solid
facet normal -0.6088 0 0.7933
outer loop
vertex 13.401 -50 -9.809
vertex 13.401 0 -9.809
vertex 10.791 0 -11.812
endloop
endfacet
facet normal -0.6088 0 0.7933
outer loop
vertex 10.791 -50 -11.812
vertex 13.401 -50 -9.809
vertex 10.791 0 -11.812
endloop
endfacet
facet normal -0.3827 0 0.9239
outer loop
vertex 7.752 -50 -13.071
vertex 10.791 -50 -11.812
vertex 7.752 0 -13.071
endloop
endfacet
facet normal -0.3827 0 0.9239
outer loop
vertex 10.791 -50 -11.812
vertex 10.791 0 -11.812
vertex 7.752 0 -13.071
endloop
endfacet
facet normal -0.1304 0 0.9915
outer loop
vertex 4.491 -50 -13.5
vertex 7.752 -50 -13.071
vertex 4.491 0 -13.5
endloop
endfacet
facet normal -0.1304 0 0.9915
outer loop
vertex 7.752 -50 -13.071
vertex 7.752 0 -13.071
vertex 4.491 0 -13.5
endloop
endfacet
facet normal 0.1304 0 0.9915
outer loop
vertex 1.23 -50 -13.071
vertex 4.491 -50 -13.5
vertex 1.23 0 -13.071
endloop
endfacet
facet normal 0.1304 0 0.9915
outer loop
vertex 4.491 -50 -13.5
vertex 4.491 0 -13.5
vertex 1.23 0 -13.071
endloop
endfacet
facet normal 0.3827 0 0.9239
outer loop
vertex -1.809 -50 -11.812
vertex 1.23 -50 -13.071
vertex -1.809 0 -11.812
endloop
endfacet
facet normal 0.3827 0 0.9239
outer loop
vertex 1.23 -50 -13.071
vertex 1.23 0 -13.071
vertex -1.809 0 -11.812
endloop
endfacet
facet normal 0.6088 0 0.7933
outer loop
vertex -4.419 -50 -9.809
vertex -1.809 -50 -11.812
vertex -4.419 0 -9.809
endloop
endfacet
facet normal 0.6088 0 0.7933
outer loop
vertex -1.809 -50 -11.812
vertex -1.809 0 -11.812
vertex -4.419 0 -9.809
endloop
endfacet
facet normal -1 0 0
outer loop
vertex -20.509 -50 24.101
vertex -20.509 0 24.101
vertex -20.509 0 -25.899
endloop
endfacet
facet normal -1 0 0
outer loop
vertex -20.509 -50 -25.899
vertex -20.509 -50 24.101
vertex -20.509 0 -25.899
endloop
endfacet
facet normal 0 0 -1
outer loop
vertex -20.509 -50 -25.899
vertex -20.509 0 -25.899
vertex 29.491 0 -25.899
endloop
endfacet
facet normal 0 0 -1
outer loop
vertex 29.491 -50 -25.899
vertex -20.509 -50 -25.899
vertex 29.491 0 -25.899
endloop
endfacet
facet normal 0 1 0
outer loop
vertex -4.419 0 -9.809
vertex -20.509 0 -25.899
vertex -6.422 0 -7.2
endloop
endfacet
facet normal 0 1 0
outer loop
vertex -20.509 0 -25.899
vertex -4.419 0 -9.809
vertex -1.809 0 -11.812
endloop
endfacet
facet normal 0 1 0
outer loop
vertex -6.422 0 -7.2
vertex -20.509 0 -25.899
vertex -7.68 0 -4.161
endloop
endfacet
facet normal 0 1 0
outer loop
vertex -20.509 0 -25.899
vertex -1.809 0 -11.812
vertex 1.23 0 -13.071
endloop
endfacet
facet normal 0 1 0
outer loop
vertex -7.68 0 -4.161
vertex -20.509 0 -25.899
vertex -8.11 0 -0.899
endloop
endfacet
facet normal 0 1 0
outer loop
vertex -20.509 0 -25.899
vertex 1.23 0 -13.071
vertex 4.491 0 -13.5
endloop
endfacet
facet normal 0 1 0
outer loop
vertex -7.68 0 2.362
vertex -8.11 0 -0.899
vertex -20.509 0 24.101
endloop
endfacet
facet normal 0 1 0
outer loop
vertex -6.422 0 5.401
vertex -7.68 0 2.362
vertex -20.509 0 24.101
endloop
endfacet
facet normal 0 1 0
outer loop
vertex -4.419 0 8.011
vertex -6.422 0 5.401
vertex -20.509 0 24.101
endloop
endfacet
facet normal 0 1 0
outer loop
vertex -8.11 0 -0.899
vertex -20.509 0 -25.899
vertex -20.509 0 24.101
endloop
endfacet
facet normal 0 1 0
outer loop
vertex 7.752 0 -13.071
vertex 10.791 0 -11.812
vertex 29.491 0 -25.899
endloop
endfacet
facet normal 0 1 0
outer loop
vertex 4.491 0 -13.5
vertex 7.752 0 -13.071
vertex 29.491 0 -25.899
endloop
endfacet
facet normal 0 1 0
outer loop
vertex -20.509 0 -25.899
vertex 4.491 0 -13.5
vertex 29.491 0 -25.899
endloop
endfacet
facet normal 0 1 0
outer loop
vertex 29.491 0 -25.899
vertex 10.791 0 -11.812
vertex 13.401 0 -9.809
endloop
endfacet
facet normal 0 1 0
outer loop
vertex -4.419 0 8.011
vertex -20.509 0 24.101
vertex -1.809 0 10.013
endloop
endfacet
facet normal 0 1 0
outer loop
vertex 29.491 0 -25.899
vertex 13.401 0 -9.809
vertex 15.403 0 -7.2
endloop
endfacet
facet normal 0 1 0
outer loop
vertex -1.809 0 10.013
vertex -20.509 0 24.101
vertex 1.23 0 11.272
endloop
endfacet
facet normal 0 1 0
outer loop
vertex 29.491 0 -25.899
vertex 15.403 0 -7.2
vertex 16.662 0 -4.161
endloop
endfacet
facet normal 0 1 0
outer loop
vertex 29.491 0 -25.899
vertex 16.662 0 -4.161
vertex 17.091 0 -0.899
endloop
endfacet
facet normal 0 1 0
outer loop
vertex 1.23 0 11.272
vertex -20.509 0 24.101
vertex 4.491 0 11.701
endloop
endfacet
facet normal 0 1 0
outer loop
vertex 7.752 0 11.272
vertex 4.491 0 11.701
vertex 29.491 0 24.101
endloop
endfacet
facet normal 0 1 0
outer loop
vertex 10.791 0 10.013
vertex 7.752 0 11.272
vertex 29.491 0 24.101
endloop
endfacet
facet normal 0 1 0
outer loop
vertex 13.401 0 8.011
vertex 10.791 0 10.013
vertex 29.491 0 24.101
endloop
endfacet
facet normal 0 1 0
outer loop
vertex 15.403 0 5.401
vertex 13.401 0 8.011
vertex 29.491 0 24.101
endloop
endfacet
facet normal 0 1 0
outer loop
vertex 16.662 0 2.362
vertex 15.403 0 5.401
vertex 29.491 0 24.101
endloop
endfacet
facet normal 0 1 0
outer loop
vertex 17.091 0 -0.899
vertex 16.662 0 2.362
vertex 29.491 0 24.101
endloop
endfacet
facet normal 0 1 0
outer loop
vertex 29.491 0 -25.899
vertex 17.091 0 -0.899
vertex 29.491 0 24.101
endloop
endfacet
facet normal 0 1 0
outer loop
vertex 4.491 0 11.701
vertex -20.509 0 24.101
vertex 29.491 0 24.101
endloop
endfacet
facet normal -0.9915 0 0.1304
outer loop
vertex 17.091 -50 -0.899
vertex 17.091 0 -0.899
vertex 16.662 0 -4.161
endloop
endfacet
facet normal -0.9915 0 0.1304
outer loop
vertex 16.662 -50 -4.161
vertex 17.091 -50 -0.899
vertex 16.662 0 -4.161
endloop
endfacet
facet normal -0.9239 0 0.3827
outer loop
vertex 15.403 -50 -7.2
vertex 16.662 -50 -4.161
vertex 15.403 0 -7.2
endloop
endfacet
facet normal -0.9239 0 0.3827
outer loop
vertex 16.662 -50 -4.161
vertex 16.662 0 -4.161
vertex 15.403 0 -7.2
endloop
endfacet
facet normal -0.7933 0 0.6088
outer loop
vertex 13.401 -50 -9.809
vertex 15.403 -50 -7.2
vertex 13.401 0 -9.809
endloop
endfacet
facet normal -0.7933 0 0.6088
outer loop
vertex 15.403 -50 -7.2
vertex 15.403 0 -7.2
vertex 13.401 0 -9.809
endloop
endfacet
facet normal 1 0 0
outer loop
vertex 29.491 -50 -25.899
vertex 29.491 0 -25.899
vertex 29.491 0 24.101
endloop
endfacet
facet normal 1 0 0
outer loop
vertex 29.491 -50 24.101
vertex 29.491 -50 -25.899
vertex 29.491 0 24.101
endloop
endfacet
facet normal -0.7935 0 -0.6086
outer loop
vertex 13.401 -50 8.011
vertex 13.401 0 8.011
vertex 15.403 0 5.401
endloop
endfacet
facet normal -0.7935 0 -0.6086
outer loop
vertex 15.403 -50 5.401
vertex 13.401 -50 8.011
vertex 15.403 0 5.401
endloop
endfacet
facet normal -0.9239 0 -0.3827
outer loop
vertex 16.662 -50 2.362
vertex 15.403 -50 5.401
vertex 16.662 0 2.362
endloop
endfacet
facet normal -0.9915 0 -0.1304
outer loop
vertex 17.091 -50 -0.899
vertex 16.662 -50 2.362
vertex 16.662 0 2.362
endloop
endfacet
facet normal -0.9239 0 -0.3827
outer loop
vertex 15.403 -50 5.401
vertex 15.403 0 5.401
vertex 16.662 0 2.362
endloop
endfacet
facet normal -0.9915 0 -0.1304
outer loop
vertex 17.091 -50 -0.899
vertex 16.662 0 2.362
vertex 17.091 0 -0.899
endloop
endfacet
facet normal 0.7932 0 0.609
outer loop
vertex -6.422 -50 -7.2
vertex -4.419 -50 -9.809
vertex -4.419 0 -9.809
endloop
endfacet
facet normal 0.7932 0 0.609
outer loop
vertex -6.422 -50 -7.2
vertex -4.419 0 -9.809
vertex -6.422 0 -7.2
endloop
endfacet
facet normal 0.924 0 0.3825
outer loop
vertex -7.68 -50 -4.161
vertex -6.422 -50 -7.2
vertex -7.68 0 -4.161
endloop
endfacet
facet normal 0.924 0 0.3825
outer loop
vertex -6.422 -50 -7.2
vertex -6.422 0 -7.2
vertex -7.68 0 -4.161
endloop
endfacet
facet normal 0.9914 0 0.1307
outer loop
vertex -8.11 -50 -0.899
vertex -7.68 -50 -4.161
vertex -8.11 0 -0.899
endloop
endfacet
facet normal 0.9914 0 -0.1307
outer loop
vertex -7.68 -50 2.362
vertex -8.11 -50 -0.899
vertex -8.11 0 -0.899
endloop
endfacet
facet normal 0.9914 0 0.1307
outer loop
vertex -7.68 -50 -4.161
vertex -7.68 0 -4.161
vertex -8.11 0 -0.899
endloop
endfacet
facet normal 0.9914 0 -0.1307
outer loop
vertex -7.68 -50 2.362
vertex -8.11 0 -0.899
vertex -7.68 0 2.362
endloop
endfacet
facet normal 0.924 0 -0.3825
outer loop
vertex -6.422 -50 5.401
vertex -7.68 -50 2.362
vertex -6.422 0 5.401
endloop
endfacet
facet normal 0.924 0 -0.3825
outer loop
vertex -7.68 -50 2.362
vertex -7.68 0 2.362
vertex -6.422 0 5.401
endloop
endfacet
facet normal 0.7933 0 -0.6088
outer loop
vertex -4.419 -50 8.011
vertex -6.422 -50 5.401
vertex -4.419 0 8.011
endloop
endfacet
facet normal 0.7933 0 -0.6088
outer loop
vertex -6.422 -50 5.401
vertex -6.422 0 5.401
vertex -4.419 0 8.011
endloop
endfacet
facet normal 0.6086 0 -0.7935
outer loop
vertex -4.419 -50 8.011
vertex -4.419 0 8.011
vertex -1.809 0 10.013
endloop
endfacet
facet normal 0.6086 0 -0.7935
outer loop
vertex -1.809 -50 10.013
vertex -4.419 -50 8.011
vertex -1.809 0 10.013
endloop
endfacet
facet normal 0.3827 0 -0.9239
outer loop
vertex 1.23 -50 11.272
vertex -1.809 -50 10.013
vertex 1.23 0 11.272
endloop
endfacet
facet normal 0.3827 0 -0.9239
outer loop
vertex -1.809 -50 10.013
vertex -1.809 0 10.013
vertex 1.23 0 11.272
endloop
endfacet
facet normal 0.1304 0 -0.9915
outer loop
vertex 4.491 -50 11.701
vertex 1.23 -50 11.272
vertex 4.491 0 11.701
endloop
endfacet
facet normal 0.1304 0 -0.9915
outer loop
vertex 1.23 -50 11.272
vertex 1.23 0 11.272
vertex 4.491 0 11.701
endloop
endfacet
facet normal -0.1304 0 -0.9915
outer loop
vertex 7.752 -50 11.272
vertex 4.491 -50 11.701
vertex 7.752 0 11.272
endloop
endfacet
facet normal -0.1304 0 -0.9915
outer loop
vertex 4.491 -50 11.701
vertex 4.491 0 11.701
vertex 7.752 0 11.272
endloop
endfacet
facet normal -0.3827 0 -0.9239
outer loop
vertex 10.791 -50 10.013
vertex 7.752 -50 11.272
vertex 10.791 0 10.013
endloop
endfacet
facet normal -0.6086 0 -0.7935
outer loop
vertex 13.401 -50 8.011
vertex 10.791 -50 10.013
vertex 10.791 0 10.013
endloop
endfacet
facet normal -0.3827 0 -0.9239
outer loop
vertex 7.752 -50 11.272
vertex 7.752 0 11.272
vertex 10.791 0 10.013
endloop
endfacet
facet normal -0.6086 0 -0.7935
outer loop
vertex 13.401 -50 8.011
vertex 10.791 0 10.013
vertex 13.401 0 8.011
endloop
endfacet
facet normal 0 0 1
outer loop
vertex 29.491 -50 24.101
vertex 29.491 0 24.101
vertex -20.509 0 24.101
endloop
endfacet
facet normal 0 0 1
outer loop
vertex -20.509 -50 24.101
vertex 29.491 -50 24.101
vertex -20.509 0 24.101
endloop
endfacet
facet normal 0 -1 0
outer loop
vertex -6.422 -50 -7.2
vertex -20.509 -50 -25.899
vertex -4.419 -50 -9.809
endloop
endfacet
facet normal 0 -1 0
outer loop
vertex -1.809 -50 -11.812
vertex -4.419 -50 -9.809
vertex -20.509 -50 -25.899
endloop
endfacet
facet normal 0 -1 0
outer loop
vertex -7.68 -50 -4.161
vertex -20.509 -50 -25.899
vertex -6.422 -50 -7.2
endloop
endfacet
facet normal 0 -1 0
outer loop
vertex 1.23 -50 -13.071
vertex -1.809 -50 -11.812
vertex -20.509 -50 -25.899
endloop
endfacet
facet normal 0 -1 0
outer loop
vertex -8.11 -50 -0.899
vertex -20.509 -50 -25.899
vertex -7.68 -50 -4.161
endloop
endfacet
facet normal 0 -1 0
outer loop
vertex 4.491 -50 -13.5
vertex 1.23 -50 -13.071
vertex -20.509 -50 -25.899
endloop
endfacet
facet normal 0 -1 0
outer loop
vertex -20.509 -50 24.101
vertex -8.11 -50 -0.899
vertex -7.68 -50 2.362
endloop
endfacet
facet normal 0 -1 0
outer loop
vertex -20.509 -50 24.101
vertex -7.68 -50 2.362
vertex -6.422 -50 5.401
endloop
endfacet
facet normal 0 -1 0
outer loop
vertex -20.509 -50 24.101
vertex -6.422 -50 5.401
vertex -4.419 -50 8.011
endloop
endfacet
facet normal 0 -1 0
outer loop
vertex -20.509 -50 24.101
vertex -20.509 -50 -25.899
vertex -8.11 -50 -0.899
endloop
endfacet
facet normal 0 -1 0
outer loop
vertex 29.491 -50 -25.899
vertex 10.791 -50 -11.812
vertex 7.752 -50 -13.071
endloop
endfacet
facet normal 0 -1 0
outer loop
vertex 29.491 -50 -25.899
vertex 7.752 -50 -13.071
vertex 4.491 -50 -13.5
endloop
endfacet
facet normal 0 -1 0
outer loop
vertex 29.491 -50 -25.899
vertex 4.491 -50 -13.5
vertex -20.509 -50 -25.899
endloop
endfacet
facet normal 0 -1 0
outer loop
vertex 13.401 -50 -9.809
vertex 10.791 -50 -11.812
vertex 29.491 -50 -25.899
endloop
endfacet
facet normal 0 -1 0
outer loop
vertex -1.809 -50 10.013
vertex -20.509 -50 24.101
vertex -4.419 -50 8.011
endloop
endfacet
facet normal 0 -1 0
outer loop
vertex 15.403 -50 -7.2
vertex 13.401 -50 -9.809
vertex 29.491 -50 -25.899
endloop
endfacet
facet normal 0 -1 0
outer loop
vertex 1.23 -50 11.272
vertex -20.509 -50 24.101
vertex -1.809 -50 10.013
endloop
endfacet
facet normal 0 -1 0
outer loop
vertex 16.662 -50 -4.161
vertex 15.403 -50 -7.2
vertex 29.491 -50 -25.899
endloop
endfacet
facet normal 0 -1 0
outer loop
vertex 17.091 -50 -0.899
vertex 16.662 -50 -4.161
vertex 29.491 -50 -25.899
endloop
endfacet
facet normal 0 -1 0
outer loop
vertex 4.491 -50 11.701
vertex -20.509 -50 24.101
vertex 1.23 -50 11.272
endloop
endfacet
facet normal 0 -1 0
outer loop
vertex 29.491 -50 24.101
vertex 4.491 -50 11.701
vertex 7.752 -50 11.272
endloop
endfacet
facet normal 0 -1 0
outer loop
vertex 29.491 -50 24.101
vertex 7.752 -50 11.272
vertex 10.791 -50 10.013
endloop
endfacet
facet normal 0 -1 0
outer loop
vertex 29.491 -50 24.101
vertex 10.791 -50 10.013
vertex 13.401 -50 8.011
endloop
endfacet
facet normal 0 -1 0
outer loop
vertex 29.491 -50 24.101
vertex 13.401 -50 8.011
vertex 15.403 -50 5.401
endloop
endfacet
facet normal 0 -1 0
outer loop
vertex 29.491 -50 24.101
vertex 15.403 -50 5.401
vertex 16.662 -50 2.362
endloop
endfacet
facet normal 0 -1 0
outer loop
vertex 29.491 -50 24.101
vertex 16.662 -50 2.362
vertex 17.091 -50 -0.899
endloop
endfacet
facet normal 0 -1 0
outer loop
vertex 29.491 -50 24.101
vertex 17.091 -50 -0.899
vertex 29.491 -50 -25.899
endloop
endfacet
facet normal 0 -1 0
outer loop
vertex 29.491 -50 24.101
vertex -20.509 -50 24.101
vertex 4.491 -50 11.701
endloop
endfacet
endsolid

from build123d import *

# Parameters (mm, degrees)
F1_DEPTH = 50


with BuildPart() as f1:
    # F0 (on Front) → F1 (new body)
    with BuildSketch(Plane.XZ):
        with BuildLine():
            Line((-4.419141, 8.010539), (-20.509183, 24.100582))
            Line((-20.509183, 24.100582), (-20.509183, -25.899418))
            Line((-20.509183, -25.899418), (-4.419141, -9.809375))
            ThreePointArc((-4.419141, -9.809375), (-8.109766, -0.899418), (-4.419141, 8.010539))
        make_face()
        with BuildLine():
            Line((29.490817, 24.100582), (-20.509183, 24.100582))
            Line((-20.509183, 24.100582), (-4.419141, 8.010539))
            ThreePointArc((-4.419141, 8.010539), (4.490817, 11.701165), (13.400774, 8.010539))
            Line((13.400774, 8.010539), (29.490817, 24.100582))
        make_face()
        with BuildLine():
            Line((-4.419141, -9.809375), (-20.509183, -25.899418))
            Line((-20.509183, -25.899418), (29.490817, -25.899418))
            Line((29.490817, -25.899418), (13.400774, -9.809375))
            ThreePointArc((13.400774, -9.809375), (4.490817, -13.5), (-4.419141, -9.809375))
        make_face()
        with BuildLine():
            Line((29.490817, -25.899418), (29.490817, 24.100582))
            Line((29.490817, 24.100582), (13.400774, 8.010539))
            ThreePointArc((13.400774, 8.010539), (16.132237, 3.922616), (17.091399, -0.899418))
            ThreePointArc((17.091399, -0.899418), (16.132237, -5.721452), (13.400774, -9.809375))
            Line((13.400774, -9.809375), (29.490817, -25.899418))
        make_face()
    extrude(amount=F1_DEPTH)


solid = f1.part
